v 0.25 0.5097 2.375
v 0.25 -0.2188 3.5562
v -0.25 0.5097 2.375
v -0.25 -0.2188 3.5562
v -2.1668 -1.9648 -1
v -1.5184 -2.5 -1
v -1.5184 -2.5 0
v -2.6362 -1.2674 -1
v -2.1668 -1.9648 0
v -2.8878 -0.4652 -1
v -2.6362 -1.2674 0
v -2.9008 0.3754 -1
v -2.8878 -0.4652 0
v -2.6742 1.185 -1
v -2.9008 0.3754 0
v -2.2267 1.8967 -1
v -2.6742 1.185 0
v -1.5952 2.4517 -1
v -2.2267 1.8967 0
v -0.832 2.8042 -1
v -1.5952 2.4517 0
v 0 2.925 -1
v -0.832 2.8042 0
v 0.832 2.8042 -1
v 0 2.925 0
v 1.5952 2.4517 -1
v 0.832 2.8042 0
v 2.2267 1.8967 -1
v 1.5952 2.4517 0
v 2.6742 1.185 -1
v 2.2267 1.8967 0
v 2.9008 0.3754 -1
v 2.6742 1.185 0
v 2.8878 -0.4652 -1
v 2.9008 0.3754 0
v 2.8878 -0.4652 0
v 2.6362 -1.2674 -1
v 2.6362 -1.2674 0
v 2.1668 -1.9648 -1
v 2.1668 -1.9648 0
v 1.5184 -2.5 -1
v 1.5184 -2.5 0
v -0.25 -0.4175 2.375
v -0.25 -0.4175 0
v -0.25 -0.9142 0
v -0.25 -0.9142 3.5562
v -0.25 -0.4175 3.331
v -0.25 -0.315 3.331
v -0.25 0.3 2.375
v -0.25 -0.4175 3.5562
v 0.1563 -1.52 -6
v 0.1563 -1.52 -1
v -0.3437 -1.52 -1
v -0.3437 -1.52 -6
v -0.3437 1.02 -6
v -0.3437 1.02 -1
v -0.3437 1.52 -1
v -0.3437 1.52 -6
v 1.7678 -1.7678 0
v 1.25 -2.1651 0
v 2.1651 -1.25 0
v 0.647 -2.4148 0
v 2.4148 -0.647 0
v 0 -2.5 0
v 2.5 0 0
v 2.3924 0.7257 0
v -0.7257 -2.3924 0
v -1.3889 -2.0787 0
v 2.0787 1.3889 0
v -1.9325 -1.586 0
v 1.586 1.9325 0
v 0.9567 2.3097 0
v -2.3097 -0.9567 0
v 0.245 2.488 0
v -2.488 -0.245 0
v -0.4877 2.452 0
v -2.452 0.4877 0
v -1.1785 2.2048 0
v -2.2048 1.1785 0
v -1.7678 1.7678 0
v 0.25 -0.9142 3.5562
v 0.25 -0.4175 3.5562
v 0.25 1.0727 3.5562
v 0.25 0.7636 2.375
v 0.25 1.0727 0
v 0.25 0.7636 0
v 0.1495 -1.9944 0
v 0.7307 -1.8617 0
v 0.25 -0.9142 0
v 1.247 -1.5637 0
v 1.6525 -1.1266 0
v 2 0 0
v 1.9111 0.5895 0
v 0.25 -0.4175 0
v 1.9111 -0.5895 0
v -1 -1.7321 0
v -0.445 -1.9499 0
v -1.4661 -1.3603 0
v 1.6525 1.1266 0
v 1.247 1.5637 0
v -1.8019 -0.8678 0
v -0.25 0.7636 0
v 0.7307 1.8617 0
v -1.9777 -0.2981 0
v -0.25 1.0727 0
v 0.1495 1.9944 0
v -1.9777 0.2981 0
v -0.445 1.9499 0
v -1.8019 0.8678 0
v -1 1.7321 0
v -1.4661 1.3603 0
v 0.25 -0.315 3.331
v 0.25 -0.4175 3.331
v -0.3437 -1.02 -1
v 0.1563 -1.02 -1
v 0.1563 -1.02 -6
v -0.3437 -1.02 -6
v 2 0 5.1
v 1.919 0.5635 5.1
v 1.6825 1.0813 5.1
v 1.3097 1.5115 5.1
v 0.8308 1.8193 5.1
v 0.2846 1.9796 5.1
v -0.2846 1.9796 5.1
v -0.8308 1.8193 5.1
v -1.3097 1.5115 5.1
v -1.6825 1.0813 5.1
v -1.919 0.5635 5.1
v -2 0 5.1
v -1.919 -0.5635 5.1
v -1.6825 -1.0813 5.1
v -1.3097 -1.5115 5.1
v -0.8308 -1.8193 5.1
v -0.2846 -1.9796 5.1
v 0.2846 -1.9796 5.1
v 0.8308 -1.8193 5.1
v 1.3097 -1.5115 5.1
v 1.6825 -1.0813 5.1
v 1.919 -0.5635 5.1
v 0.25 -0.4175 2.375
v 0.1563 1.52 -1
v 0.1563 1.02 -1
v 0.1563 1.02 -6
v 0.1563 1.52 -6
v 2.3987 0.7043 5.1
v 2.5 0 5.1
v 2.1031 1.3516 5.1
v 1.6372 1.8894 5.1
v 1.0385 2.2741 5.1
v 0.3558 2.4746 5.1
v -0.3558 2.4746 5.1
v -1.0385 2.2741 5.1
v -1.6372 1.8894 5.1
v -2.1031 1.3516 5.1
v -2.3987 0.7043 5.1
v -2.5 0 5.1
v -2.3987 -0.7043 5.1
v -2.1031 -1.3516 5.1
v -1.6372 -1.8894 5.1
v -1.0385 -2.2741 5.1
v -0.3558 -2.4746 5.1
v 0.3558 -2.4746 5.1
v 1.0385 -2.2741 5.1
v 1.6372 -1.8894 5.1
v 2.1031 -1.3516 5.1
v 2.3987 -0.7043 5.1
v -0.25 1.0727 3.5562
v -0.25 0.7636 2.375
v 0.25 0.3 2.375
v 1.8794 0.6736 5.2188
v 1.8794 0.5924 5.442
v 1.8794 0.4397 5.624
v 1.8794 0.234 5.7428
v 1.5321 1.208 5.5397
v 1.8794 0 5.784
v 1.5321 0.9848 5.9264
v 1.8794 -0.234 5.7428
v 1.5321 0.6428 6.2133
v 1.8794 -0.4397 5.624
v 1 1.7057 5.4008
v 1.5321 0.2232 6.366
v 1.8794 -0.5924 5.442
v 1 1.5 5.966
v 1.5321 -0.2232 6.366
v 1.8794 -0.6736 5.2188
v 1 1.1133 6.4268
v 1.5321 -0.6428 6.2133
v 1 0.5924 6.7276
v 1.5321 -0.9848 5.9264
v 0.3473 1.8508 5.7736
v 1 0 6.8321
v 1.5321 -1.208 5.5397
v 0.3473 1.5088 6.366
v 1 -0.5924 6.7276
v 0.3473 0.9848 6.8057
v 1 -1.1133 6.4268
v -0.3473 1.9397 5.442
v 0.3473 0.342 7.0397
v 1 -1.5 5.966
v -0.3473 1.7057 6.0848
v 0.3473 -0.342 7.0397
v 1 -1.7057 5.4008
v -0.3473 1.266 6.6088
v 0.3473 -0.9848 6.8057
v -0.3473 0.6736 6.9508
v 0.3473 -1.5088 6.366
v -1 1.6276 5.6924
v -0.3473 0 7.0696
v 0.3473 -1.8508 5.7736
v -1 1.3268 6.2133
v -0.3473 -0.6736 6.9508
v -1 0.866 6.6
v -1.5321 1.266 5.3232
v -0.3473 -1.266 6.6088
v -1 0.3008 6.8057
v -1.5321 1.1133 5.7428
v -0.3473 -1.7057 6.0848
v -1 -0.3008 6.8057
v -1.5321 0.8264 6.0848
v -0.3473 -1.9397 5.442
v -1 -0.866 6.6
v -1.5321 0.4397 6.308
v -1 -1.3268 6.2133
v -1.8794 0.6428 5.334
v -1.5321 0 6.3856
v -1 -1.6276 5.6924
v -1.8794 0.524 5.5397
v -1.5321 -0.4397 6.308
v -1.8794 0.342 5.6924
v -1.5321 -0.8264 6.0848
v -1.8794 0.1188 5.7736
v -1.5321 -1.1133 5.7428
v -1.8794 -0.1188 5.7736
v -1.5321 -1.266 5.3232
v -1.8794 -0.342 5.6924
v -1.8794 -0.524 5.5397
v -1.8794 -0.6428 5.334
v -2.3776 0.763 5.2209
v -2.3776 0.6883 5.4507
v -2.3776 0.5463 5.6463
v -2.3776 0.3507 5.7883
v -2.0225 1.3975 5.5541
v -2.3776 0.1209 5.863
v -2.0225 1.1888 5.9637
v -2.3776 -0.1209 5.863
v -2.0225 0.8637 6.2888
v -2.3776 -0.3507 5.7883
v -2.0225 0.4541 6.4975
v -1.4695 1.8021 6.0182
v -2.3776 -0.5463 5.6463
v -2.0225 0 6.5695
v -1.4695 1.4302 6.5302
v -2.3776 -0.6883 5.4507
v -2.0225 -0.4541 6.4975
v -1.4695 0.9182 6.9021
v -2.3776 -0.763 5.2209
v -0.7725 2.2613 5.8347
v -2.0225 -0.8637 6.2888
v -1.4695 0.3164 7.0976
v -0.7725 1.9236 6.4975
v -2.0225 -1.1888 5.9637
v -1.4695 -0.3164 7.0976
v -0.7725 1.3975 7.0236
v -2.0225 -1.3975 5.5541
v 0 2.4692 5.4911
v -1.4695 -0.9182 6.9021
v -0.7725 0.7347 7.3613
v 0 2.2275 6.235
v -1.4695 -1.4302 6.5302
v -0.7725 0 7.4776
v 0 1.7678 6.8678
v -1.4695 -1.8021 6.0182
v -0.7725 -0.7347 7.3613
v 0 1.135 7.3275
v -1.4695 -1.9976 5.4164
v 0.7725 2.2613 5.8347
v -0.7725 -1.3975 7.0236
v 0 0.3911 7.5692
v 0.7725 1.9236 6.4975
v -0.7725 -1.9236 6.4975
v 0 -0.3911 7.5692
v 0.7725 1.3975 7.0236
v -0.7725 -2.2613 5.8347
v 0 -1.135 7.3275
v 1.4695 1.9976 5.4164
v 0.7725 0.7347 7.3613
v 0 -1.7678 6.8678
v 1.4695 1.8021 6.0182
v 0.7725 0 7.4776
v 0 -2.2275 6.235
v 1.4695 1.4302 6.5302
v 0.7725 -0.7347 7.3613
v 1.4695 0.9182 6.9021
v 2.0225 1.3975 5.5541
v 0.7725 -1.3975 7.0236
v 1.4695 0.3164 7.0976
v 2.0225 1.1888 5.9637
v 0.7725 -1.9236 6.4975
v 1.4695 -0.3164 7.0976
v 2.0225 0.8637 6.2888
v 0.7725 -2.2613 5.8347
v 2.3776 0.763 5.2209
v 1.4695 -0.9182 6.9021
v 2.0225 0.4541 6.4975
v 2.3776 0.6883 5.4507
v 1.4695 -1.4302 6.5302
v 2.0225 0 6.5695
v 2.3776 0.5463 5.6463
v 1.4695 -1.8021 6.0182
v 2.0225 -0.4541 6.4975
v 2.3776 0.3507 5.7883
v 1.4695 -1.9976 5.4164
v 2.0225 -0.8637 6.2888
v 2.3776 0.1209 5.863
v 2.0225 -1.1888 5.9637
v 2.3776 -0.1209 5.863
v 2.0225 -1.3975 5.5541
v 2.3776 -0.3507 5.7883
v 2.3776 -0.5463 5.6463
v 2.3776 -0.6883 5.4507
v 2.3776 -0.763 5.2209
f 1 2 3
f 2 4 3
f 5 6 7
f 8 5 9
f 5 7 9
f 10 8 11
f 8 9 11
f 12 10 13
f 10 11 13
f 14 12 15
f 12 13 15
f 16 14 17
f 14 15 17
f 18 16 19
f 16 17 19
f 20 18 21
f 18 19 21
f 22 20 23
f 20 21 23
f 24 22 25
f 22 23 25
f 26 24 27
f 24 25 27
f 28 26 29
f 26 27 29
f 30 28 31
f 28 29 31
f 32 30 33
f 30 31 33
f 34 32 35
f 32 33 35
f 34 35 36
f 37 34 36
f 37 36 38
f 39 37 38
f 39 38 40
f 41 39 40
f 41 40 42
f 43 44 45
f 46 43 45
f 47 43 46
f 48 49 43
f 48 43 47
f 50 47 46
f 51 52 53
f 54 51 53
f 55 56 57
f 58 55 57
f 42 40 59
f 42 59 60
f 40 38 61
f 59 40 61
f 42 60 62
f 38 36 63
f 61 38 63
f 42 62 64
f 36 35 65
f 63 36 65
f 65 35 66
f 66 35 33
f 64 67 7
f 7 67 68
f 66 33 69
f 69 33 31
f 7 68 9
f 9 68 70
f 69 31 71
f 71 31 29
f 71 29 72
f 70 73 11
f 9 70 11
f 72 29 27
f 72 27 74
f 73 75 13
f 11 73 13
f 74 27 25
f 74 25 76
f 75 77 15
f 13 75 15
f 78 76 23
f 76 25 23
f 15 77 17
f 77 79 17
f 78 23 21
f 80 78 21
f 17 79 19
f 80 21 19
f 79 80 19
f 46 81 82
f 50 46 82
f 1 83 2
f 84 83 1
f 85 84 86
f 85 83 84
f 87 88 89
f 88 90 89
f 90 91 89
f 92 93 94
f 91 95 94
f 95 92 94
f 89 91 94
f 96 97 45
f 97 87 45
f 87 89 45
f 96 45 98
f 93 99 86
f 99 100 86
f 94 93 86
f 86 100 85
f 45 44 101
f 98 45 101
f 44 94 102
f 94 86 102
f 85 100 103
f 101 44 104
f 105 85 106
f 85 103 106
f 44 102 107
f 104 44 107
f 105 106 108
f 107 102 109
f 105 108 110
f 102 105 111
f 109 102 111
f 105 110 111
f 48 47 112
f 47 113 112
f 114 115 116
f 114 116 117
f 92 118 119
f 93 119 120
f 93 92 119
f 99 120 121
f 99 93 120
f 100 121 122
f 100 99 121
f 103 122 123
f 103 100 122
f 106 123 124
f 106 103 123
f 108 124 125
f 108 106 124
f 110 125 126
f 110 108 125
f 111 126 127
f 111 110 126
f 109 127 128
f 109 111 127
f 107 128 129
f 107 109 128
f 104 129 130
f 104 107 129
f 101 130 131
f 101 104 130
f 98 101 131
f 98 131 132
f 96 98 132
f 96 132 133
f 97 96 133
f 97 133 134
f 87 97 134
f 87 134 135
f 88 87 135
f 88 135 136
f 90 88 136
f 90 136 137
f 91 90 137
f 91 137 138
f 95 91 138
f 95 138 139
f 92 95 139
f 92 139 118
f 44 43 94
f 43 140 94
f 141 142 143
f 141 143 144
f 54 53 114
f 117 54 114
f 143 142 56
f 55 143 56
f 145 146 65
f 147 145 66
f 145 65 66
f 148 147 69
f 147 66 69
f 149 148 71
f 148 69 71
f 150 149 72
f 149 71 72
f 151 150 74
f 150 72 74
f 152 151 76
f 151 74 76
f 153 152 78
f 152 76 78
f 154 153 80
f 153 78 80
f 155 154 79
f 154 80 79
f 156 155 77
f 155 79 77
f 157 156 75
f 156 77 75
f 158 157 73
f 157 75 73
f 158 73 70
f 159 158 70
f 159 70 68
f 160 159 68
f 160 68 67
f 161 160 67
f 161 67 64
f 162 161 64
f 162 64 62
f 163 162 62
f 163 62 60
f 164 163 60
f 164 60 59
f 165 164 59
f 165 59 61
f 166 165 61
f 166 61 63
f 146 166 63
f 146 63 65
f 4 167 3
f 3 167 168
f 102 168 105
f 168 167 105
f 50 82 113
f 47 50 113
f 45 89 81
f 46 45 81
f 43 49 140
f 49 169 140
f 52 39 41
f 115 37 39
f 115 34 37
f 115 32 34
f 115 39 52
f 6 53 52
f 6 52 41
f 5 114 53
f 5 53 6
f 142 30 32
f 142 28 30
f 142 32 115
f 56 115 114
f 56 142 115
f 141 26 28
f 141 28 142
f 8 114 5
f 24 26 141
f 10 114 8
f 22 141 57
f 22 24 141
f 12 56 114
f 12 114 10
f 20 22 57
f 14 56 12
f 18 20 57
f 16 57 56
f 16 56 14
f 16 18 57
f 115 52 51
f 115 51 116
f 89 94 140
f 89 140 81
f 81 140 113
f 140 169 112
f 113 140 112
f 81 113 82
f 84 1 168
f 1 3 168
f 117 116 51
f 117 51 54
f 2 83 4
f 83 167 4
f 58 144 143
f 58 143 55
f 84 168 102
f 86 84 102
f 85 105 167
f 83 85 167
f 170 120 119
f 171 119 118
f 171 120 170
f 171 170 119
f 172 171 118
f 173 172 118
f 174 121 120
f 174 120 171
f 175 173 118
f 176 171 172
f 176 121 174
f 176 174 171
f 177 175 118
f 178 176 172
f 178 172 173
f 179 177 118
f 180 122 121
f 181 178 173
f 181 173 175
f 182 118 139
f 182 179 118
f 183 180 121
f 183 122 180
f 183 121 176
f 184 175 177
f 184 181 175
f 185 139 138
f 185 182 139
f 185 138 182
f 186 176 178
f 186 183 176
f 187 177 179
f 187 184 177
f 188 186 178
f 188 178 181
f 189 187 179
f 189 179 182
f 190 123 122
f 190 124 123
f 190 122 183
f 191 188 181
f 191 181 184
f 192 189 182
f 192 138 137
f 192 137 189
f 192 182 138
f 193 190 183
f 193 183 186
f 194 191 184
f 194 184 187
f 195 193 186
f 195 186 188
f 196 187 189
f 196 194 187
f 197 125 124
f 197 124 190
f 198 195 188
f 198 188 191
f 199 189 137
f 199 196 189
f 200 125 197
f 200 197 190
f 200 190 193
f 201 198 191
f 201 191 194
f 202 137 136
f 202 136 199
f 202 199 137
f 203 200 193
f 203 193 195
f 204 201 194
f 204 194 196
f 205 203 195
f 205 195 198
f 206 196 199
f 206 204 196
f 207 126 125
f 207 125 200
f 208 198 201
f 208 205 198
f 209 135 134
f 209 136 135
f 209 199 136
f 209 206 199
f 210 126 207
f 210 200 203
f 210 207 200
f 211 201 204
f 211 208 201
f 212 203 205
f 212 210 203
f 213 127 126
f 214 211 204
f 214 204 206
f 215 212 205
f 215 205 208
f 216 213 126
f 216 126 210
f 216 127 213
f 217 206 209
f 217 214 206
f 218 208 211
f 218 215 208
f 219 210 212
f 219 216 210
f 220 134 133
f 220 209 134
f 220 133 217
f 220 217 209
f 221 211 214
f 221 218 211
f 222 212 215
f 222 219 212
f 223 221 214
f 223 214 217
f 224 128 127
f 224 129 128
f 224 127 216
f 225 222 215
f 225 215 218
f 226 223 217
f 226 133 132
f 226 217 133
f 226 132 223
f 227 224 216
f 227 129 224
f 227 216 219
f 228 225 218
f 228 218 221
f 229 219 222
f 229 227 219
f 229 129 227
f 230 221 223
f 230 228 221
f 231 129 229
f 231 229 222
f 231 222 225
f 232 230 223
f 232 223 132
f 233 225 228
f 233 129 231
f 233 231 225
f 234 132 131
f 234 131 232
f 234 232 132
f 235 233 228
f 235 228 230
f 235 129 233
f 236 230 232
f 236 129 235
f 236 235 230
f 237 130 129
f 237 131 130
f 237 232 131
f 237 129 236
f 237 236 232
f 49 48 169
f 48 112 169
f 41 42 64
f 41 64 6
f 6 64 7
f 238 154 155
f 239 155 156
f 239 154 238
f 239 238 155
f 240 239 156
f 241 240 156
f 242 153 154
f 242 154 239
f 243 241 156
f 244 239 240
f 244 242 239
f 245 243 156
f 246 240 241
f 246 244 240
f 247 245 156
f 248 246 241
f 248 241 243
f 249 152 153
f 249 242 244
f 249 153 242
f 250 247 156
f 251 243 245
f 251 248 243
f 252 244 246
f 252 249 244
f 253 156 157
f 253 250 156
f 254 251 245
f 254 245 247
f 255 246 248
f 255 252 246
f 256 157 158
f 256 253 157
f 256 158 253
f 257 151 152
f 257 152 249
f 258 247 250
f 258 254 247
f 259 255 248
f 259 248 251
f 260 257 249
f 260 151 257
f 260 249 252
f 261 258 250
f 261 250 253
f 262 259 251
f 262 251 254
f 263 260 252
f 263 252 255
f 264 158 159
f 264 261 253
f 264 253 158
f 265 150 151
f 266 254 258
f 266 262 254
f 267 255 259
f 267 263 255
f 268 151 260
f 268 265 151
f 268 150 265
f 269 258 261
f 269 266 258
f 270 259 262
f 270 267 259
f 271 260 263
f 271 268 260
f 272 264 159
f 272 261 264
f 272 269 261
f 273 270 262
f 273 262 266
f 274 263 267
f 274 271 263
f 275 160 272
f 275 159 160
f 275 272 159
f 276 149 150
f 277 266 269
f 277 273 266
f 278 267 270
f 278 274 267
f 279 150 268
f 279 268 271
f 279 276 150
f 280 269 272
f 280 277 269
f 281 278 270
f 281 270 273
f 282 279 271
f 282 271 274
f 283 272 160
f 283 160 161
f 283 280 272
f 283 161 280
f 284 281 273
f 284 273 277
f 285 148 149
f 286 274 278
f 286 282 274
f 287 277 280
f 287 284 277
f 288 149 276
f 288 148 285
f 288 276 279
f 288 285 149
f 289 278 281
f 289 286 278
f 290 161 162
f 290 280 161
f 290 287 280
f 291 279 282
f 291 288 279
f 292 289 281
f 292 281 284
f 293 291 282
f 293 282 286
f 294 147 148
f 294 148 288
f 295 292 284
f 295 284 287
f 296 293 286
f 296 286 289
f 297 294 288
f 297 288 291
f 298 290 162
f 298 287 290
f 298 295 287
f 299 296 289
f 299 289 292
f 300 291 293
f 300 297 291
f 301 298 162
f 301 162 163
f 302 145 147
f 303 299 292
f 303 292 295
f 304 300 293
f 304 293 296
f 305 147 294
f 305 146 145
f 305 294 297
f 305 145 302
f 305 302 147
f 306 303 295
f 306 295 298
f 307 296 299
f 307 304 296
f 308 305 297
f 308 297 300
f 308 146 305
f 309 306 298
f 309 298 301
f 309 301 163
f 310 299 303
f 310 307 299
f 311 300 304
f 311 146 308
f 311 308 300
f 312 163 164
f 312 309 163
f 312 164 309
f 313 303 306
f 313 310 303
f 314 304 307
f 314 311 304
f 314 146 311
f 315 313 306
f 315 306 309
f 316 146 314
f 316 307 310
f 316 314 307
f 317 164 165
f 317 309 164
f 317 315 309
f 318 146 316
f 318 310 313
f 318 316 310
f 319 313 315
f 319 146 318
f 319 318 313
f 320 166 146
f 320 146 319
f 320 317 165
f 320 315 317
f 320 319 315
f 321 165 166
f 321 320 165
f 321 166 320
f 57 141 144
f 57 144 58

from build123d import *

# Parameters (mm, degrees)
SKETCH1_R           = 2.5
SKETCH1_R_2         = 2
BOSS_EXTRUDE1_DEPTH = 5.1
REVOLVE1_ANGLE      = 180
SKETCH5_R           = 2.925
BOSS_EXTRUDE2_DEPTH = 1
BOSS_EXTRUDE3_DEPTH = 0.25
SKETCH13_W          = 0.5
SKETCH13_H          = 0.5
BOSS_EXTRUDE4_DEPTH = 5
CUT_EXTRUDE2_DEPTH  = 5


with BuildPart() as part:
    # Sketch1 → Boss-Extrude1 (new body)
    with BuildSketch(Plane.XY):
        Circle(SKETCH1_R)
        Circle(SKETCH1_R_2, mode=Mode.SUBTRACT)
    extrude(amount=BOSS_EXTRUDE1_DEPTH)

    # Sketch4 → Revolve1 (revolve)
    with BuildSketch(Plane.XY.offset(5.1)):
        with BuildLine():
            Line((-2, 0), (-2.5, 0))
            ThreePointArc((-2.5, 0), (0, 2.5), (2.5, 0))
            Line((2.5, 0), (2, 0))
            ThreePointArc((2, 0), (0, 2), (-2, 0))
        make_face()
    revolve(axis=Axis((-2.5, 0, 5.1), (1, 0, 0)), revolution_arc=REVOLVE1_ANGLE)

    # Sketch5 → Boss-Extrude2 (add)
    with BuildSketch(Plane(origin=(0, 0, 0), x_dir=(-1, 0, 0), z_dir=(0, 0, -1))):
        Circle(SKETCH5_R)
    extrude(amount=BOSS_EXTRUDE2_DEPTH)

    # Sketch8 → Boss-Extrude3 (add, symmetric)
    with BuildSketch(Plane(origin=(0, 0, 0), x_dir=(0, 0, -1), z_dir=(1, 0, 0))):
        Polygon((0, 1.072701591), (-3.556166294, 1.072701591), (-3.556166294, -0.218813925), (-2.37503672, 0.509733289), (-2.37503672, 0.763620955), (0, 0.763620955), align=None)
        Polygon((-3.556166294, -0.41750862), (-3.330966178, -0.41750862), (-3.330966178, -0.31503842), (-2.37503672, 0.3), (-2.37503672, -0.41750862), (0, -0.41750862), (0, -0.914245357), (-3.556166294, -0.914245357), align=None)
    extrude(amount=BOSS_EXTRUDE3_DEPTH, both=True)

    # Sketch13 → Boss-Extrude4 (add)
    with BuildSketch(Plane(origin=(0, 0, -1), x_dir=(-1, 0, 0), z_dir=(0, 0, -1))):
        with Locations((0.093693205, -1.27)):
            Rectangle(SKETCH13_W, SKETCH13_H)
        with Locations((0.093693205, 1.27)):
            Rectangle(SKETCH13_W, SKETCH13_H)
    extrude(amount=BOSS_EXTRUDE4_DEPTH)

    # Sketch14 → Cut-Extrude2 (cut)
    with BuildSketch(Plane.XY):
        with BuildLine():
            Line((1.518428464, -2.5), (-1.518428464, -2.5))
            ThreePointArc((-1.518428464, -2.5), (0, -2.925), (1.518428464, -2.5))
        make_face()
    extrude(amount=-CUT_EXTRUDE2_DEPTH, mode=Mode.SUBTRACT)


solid = part.part
